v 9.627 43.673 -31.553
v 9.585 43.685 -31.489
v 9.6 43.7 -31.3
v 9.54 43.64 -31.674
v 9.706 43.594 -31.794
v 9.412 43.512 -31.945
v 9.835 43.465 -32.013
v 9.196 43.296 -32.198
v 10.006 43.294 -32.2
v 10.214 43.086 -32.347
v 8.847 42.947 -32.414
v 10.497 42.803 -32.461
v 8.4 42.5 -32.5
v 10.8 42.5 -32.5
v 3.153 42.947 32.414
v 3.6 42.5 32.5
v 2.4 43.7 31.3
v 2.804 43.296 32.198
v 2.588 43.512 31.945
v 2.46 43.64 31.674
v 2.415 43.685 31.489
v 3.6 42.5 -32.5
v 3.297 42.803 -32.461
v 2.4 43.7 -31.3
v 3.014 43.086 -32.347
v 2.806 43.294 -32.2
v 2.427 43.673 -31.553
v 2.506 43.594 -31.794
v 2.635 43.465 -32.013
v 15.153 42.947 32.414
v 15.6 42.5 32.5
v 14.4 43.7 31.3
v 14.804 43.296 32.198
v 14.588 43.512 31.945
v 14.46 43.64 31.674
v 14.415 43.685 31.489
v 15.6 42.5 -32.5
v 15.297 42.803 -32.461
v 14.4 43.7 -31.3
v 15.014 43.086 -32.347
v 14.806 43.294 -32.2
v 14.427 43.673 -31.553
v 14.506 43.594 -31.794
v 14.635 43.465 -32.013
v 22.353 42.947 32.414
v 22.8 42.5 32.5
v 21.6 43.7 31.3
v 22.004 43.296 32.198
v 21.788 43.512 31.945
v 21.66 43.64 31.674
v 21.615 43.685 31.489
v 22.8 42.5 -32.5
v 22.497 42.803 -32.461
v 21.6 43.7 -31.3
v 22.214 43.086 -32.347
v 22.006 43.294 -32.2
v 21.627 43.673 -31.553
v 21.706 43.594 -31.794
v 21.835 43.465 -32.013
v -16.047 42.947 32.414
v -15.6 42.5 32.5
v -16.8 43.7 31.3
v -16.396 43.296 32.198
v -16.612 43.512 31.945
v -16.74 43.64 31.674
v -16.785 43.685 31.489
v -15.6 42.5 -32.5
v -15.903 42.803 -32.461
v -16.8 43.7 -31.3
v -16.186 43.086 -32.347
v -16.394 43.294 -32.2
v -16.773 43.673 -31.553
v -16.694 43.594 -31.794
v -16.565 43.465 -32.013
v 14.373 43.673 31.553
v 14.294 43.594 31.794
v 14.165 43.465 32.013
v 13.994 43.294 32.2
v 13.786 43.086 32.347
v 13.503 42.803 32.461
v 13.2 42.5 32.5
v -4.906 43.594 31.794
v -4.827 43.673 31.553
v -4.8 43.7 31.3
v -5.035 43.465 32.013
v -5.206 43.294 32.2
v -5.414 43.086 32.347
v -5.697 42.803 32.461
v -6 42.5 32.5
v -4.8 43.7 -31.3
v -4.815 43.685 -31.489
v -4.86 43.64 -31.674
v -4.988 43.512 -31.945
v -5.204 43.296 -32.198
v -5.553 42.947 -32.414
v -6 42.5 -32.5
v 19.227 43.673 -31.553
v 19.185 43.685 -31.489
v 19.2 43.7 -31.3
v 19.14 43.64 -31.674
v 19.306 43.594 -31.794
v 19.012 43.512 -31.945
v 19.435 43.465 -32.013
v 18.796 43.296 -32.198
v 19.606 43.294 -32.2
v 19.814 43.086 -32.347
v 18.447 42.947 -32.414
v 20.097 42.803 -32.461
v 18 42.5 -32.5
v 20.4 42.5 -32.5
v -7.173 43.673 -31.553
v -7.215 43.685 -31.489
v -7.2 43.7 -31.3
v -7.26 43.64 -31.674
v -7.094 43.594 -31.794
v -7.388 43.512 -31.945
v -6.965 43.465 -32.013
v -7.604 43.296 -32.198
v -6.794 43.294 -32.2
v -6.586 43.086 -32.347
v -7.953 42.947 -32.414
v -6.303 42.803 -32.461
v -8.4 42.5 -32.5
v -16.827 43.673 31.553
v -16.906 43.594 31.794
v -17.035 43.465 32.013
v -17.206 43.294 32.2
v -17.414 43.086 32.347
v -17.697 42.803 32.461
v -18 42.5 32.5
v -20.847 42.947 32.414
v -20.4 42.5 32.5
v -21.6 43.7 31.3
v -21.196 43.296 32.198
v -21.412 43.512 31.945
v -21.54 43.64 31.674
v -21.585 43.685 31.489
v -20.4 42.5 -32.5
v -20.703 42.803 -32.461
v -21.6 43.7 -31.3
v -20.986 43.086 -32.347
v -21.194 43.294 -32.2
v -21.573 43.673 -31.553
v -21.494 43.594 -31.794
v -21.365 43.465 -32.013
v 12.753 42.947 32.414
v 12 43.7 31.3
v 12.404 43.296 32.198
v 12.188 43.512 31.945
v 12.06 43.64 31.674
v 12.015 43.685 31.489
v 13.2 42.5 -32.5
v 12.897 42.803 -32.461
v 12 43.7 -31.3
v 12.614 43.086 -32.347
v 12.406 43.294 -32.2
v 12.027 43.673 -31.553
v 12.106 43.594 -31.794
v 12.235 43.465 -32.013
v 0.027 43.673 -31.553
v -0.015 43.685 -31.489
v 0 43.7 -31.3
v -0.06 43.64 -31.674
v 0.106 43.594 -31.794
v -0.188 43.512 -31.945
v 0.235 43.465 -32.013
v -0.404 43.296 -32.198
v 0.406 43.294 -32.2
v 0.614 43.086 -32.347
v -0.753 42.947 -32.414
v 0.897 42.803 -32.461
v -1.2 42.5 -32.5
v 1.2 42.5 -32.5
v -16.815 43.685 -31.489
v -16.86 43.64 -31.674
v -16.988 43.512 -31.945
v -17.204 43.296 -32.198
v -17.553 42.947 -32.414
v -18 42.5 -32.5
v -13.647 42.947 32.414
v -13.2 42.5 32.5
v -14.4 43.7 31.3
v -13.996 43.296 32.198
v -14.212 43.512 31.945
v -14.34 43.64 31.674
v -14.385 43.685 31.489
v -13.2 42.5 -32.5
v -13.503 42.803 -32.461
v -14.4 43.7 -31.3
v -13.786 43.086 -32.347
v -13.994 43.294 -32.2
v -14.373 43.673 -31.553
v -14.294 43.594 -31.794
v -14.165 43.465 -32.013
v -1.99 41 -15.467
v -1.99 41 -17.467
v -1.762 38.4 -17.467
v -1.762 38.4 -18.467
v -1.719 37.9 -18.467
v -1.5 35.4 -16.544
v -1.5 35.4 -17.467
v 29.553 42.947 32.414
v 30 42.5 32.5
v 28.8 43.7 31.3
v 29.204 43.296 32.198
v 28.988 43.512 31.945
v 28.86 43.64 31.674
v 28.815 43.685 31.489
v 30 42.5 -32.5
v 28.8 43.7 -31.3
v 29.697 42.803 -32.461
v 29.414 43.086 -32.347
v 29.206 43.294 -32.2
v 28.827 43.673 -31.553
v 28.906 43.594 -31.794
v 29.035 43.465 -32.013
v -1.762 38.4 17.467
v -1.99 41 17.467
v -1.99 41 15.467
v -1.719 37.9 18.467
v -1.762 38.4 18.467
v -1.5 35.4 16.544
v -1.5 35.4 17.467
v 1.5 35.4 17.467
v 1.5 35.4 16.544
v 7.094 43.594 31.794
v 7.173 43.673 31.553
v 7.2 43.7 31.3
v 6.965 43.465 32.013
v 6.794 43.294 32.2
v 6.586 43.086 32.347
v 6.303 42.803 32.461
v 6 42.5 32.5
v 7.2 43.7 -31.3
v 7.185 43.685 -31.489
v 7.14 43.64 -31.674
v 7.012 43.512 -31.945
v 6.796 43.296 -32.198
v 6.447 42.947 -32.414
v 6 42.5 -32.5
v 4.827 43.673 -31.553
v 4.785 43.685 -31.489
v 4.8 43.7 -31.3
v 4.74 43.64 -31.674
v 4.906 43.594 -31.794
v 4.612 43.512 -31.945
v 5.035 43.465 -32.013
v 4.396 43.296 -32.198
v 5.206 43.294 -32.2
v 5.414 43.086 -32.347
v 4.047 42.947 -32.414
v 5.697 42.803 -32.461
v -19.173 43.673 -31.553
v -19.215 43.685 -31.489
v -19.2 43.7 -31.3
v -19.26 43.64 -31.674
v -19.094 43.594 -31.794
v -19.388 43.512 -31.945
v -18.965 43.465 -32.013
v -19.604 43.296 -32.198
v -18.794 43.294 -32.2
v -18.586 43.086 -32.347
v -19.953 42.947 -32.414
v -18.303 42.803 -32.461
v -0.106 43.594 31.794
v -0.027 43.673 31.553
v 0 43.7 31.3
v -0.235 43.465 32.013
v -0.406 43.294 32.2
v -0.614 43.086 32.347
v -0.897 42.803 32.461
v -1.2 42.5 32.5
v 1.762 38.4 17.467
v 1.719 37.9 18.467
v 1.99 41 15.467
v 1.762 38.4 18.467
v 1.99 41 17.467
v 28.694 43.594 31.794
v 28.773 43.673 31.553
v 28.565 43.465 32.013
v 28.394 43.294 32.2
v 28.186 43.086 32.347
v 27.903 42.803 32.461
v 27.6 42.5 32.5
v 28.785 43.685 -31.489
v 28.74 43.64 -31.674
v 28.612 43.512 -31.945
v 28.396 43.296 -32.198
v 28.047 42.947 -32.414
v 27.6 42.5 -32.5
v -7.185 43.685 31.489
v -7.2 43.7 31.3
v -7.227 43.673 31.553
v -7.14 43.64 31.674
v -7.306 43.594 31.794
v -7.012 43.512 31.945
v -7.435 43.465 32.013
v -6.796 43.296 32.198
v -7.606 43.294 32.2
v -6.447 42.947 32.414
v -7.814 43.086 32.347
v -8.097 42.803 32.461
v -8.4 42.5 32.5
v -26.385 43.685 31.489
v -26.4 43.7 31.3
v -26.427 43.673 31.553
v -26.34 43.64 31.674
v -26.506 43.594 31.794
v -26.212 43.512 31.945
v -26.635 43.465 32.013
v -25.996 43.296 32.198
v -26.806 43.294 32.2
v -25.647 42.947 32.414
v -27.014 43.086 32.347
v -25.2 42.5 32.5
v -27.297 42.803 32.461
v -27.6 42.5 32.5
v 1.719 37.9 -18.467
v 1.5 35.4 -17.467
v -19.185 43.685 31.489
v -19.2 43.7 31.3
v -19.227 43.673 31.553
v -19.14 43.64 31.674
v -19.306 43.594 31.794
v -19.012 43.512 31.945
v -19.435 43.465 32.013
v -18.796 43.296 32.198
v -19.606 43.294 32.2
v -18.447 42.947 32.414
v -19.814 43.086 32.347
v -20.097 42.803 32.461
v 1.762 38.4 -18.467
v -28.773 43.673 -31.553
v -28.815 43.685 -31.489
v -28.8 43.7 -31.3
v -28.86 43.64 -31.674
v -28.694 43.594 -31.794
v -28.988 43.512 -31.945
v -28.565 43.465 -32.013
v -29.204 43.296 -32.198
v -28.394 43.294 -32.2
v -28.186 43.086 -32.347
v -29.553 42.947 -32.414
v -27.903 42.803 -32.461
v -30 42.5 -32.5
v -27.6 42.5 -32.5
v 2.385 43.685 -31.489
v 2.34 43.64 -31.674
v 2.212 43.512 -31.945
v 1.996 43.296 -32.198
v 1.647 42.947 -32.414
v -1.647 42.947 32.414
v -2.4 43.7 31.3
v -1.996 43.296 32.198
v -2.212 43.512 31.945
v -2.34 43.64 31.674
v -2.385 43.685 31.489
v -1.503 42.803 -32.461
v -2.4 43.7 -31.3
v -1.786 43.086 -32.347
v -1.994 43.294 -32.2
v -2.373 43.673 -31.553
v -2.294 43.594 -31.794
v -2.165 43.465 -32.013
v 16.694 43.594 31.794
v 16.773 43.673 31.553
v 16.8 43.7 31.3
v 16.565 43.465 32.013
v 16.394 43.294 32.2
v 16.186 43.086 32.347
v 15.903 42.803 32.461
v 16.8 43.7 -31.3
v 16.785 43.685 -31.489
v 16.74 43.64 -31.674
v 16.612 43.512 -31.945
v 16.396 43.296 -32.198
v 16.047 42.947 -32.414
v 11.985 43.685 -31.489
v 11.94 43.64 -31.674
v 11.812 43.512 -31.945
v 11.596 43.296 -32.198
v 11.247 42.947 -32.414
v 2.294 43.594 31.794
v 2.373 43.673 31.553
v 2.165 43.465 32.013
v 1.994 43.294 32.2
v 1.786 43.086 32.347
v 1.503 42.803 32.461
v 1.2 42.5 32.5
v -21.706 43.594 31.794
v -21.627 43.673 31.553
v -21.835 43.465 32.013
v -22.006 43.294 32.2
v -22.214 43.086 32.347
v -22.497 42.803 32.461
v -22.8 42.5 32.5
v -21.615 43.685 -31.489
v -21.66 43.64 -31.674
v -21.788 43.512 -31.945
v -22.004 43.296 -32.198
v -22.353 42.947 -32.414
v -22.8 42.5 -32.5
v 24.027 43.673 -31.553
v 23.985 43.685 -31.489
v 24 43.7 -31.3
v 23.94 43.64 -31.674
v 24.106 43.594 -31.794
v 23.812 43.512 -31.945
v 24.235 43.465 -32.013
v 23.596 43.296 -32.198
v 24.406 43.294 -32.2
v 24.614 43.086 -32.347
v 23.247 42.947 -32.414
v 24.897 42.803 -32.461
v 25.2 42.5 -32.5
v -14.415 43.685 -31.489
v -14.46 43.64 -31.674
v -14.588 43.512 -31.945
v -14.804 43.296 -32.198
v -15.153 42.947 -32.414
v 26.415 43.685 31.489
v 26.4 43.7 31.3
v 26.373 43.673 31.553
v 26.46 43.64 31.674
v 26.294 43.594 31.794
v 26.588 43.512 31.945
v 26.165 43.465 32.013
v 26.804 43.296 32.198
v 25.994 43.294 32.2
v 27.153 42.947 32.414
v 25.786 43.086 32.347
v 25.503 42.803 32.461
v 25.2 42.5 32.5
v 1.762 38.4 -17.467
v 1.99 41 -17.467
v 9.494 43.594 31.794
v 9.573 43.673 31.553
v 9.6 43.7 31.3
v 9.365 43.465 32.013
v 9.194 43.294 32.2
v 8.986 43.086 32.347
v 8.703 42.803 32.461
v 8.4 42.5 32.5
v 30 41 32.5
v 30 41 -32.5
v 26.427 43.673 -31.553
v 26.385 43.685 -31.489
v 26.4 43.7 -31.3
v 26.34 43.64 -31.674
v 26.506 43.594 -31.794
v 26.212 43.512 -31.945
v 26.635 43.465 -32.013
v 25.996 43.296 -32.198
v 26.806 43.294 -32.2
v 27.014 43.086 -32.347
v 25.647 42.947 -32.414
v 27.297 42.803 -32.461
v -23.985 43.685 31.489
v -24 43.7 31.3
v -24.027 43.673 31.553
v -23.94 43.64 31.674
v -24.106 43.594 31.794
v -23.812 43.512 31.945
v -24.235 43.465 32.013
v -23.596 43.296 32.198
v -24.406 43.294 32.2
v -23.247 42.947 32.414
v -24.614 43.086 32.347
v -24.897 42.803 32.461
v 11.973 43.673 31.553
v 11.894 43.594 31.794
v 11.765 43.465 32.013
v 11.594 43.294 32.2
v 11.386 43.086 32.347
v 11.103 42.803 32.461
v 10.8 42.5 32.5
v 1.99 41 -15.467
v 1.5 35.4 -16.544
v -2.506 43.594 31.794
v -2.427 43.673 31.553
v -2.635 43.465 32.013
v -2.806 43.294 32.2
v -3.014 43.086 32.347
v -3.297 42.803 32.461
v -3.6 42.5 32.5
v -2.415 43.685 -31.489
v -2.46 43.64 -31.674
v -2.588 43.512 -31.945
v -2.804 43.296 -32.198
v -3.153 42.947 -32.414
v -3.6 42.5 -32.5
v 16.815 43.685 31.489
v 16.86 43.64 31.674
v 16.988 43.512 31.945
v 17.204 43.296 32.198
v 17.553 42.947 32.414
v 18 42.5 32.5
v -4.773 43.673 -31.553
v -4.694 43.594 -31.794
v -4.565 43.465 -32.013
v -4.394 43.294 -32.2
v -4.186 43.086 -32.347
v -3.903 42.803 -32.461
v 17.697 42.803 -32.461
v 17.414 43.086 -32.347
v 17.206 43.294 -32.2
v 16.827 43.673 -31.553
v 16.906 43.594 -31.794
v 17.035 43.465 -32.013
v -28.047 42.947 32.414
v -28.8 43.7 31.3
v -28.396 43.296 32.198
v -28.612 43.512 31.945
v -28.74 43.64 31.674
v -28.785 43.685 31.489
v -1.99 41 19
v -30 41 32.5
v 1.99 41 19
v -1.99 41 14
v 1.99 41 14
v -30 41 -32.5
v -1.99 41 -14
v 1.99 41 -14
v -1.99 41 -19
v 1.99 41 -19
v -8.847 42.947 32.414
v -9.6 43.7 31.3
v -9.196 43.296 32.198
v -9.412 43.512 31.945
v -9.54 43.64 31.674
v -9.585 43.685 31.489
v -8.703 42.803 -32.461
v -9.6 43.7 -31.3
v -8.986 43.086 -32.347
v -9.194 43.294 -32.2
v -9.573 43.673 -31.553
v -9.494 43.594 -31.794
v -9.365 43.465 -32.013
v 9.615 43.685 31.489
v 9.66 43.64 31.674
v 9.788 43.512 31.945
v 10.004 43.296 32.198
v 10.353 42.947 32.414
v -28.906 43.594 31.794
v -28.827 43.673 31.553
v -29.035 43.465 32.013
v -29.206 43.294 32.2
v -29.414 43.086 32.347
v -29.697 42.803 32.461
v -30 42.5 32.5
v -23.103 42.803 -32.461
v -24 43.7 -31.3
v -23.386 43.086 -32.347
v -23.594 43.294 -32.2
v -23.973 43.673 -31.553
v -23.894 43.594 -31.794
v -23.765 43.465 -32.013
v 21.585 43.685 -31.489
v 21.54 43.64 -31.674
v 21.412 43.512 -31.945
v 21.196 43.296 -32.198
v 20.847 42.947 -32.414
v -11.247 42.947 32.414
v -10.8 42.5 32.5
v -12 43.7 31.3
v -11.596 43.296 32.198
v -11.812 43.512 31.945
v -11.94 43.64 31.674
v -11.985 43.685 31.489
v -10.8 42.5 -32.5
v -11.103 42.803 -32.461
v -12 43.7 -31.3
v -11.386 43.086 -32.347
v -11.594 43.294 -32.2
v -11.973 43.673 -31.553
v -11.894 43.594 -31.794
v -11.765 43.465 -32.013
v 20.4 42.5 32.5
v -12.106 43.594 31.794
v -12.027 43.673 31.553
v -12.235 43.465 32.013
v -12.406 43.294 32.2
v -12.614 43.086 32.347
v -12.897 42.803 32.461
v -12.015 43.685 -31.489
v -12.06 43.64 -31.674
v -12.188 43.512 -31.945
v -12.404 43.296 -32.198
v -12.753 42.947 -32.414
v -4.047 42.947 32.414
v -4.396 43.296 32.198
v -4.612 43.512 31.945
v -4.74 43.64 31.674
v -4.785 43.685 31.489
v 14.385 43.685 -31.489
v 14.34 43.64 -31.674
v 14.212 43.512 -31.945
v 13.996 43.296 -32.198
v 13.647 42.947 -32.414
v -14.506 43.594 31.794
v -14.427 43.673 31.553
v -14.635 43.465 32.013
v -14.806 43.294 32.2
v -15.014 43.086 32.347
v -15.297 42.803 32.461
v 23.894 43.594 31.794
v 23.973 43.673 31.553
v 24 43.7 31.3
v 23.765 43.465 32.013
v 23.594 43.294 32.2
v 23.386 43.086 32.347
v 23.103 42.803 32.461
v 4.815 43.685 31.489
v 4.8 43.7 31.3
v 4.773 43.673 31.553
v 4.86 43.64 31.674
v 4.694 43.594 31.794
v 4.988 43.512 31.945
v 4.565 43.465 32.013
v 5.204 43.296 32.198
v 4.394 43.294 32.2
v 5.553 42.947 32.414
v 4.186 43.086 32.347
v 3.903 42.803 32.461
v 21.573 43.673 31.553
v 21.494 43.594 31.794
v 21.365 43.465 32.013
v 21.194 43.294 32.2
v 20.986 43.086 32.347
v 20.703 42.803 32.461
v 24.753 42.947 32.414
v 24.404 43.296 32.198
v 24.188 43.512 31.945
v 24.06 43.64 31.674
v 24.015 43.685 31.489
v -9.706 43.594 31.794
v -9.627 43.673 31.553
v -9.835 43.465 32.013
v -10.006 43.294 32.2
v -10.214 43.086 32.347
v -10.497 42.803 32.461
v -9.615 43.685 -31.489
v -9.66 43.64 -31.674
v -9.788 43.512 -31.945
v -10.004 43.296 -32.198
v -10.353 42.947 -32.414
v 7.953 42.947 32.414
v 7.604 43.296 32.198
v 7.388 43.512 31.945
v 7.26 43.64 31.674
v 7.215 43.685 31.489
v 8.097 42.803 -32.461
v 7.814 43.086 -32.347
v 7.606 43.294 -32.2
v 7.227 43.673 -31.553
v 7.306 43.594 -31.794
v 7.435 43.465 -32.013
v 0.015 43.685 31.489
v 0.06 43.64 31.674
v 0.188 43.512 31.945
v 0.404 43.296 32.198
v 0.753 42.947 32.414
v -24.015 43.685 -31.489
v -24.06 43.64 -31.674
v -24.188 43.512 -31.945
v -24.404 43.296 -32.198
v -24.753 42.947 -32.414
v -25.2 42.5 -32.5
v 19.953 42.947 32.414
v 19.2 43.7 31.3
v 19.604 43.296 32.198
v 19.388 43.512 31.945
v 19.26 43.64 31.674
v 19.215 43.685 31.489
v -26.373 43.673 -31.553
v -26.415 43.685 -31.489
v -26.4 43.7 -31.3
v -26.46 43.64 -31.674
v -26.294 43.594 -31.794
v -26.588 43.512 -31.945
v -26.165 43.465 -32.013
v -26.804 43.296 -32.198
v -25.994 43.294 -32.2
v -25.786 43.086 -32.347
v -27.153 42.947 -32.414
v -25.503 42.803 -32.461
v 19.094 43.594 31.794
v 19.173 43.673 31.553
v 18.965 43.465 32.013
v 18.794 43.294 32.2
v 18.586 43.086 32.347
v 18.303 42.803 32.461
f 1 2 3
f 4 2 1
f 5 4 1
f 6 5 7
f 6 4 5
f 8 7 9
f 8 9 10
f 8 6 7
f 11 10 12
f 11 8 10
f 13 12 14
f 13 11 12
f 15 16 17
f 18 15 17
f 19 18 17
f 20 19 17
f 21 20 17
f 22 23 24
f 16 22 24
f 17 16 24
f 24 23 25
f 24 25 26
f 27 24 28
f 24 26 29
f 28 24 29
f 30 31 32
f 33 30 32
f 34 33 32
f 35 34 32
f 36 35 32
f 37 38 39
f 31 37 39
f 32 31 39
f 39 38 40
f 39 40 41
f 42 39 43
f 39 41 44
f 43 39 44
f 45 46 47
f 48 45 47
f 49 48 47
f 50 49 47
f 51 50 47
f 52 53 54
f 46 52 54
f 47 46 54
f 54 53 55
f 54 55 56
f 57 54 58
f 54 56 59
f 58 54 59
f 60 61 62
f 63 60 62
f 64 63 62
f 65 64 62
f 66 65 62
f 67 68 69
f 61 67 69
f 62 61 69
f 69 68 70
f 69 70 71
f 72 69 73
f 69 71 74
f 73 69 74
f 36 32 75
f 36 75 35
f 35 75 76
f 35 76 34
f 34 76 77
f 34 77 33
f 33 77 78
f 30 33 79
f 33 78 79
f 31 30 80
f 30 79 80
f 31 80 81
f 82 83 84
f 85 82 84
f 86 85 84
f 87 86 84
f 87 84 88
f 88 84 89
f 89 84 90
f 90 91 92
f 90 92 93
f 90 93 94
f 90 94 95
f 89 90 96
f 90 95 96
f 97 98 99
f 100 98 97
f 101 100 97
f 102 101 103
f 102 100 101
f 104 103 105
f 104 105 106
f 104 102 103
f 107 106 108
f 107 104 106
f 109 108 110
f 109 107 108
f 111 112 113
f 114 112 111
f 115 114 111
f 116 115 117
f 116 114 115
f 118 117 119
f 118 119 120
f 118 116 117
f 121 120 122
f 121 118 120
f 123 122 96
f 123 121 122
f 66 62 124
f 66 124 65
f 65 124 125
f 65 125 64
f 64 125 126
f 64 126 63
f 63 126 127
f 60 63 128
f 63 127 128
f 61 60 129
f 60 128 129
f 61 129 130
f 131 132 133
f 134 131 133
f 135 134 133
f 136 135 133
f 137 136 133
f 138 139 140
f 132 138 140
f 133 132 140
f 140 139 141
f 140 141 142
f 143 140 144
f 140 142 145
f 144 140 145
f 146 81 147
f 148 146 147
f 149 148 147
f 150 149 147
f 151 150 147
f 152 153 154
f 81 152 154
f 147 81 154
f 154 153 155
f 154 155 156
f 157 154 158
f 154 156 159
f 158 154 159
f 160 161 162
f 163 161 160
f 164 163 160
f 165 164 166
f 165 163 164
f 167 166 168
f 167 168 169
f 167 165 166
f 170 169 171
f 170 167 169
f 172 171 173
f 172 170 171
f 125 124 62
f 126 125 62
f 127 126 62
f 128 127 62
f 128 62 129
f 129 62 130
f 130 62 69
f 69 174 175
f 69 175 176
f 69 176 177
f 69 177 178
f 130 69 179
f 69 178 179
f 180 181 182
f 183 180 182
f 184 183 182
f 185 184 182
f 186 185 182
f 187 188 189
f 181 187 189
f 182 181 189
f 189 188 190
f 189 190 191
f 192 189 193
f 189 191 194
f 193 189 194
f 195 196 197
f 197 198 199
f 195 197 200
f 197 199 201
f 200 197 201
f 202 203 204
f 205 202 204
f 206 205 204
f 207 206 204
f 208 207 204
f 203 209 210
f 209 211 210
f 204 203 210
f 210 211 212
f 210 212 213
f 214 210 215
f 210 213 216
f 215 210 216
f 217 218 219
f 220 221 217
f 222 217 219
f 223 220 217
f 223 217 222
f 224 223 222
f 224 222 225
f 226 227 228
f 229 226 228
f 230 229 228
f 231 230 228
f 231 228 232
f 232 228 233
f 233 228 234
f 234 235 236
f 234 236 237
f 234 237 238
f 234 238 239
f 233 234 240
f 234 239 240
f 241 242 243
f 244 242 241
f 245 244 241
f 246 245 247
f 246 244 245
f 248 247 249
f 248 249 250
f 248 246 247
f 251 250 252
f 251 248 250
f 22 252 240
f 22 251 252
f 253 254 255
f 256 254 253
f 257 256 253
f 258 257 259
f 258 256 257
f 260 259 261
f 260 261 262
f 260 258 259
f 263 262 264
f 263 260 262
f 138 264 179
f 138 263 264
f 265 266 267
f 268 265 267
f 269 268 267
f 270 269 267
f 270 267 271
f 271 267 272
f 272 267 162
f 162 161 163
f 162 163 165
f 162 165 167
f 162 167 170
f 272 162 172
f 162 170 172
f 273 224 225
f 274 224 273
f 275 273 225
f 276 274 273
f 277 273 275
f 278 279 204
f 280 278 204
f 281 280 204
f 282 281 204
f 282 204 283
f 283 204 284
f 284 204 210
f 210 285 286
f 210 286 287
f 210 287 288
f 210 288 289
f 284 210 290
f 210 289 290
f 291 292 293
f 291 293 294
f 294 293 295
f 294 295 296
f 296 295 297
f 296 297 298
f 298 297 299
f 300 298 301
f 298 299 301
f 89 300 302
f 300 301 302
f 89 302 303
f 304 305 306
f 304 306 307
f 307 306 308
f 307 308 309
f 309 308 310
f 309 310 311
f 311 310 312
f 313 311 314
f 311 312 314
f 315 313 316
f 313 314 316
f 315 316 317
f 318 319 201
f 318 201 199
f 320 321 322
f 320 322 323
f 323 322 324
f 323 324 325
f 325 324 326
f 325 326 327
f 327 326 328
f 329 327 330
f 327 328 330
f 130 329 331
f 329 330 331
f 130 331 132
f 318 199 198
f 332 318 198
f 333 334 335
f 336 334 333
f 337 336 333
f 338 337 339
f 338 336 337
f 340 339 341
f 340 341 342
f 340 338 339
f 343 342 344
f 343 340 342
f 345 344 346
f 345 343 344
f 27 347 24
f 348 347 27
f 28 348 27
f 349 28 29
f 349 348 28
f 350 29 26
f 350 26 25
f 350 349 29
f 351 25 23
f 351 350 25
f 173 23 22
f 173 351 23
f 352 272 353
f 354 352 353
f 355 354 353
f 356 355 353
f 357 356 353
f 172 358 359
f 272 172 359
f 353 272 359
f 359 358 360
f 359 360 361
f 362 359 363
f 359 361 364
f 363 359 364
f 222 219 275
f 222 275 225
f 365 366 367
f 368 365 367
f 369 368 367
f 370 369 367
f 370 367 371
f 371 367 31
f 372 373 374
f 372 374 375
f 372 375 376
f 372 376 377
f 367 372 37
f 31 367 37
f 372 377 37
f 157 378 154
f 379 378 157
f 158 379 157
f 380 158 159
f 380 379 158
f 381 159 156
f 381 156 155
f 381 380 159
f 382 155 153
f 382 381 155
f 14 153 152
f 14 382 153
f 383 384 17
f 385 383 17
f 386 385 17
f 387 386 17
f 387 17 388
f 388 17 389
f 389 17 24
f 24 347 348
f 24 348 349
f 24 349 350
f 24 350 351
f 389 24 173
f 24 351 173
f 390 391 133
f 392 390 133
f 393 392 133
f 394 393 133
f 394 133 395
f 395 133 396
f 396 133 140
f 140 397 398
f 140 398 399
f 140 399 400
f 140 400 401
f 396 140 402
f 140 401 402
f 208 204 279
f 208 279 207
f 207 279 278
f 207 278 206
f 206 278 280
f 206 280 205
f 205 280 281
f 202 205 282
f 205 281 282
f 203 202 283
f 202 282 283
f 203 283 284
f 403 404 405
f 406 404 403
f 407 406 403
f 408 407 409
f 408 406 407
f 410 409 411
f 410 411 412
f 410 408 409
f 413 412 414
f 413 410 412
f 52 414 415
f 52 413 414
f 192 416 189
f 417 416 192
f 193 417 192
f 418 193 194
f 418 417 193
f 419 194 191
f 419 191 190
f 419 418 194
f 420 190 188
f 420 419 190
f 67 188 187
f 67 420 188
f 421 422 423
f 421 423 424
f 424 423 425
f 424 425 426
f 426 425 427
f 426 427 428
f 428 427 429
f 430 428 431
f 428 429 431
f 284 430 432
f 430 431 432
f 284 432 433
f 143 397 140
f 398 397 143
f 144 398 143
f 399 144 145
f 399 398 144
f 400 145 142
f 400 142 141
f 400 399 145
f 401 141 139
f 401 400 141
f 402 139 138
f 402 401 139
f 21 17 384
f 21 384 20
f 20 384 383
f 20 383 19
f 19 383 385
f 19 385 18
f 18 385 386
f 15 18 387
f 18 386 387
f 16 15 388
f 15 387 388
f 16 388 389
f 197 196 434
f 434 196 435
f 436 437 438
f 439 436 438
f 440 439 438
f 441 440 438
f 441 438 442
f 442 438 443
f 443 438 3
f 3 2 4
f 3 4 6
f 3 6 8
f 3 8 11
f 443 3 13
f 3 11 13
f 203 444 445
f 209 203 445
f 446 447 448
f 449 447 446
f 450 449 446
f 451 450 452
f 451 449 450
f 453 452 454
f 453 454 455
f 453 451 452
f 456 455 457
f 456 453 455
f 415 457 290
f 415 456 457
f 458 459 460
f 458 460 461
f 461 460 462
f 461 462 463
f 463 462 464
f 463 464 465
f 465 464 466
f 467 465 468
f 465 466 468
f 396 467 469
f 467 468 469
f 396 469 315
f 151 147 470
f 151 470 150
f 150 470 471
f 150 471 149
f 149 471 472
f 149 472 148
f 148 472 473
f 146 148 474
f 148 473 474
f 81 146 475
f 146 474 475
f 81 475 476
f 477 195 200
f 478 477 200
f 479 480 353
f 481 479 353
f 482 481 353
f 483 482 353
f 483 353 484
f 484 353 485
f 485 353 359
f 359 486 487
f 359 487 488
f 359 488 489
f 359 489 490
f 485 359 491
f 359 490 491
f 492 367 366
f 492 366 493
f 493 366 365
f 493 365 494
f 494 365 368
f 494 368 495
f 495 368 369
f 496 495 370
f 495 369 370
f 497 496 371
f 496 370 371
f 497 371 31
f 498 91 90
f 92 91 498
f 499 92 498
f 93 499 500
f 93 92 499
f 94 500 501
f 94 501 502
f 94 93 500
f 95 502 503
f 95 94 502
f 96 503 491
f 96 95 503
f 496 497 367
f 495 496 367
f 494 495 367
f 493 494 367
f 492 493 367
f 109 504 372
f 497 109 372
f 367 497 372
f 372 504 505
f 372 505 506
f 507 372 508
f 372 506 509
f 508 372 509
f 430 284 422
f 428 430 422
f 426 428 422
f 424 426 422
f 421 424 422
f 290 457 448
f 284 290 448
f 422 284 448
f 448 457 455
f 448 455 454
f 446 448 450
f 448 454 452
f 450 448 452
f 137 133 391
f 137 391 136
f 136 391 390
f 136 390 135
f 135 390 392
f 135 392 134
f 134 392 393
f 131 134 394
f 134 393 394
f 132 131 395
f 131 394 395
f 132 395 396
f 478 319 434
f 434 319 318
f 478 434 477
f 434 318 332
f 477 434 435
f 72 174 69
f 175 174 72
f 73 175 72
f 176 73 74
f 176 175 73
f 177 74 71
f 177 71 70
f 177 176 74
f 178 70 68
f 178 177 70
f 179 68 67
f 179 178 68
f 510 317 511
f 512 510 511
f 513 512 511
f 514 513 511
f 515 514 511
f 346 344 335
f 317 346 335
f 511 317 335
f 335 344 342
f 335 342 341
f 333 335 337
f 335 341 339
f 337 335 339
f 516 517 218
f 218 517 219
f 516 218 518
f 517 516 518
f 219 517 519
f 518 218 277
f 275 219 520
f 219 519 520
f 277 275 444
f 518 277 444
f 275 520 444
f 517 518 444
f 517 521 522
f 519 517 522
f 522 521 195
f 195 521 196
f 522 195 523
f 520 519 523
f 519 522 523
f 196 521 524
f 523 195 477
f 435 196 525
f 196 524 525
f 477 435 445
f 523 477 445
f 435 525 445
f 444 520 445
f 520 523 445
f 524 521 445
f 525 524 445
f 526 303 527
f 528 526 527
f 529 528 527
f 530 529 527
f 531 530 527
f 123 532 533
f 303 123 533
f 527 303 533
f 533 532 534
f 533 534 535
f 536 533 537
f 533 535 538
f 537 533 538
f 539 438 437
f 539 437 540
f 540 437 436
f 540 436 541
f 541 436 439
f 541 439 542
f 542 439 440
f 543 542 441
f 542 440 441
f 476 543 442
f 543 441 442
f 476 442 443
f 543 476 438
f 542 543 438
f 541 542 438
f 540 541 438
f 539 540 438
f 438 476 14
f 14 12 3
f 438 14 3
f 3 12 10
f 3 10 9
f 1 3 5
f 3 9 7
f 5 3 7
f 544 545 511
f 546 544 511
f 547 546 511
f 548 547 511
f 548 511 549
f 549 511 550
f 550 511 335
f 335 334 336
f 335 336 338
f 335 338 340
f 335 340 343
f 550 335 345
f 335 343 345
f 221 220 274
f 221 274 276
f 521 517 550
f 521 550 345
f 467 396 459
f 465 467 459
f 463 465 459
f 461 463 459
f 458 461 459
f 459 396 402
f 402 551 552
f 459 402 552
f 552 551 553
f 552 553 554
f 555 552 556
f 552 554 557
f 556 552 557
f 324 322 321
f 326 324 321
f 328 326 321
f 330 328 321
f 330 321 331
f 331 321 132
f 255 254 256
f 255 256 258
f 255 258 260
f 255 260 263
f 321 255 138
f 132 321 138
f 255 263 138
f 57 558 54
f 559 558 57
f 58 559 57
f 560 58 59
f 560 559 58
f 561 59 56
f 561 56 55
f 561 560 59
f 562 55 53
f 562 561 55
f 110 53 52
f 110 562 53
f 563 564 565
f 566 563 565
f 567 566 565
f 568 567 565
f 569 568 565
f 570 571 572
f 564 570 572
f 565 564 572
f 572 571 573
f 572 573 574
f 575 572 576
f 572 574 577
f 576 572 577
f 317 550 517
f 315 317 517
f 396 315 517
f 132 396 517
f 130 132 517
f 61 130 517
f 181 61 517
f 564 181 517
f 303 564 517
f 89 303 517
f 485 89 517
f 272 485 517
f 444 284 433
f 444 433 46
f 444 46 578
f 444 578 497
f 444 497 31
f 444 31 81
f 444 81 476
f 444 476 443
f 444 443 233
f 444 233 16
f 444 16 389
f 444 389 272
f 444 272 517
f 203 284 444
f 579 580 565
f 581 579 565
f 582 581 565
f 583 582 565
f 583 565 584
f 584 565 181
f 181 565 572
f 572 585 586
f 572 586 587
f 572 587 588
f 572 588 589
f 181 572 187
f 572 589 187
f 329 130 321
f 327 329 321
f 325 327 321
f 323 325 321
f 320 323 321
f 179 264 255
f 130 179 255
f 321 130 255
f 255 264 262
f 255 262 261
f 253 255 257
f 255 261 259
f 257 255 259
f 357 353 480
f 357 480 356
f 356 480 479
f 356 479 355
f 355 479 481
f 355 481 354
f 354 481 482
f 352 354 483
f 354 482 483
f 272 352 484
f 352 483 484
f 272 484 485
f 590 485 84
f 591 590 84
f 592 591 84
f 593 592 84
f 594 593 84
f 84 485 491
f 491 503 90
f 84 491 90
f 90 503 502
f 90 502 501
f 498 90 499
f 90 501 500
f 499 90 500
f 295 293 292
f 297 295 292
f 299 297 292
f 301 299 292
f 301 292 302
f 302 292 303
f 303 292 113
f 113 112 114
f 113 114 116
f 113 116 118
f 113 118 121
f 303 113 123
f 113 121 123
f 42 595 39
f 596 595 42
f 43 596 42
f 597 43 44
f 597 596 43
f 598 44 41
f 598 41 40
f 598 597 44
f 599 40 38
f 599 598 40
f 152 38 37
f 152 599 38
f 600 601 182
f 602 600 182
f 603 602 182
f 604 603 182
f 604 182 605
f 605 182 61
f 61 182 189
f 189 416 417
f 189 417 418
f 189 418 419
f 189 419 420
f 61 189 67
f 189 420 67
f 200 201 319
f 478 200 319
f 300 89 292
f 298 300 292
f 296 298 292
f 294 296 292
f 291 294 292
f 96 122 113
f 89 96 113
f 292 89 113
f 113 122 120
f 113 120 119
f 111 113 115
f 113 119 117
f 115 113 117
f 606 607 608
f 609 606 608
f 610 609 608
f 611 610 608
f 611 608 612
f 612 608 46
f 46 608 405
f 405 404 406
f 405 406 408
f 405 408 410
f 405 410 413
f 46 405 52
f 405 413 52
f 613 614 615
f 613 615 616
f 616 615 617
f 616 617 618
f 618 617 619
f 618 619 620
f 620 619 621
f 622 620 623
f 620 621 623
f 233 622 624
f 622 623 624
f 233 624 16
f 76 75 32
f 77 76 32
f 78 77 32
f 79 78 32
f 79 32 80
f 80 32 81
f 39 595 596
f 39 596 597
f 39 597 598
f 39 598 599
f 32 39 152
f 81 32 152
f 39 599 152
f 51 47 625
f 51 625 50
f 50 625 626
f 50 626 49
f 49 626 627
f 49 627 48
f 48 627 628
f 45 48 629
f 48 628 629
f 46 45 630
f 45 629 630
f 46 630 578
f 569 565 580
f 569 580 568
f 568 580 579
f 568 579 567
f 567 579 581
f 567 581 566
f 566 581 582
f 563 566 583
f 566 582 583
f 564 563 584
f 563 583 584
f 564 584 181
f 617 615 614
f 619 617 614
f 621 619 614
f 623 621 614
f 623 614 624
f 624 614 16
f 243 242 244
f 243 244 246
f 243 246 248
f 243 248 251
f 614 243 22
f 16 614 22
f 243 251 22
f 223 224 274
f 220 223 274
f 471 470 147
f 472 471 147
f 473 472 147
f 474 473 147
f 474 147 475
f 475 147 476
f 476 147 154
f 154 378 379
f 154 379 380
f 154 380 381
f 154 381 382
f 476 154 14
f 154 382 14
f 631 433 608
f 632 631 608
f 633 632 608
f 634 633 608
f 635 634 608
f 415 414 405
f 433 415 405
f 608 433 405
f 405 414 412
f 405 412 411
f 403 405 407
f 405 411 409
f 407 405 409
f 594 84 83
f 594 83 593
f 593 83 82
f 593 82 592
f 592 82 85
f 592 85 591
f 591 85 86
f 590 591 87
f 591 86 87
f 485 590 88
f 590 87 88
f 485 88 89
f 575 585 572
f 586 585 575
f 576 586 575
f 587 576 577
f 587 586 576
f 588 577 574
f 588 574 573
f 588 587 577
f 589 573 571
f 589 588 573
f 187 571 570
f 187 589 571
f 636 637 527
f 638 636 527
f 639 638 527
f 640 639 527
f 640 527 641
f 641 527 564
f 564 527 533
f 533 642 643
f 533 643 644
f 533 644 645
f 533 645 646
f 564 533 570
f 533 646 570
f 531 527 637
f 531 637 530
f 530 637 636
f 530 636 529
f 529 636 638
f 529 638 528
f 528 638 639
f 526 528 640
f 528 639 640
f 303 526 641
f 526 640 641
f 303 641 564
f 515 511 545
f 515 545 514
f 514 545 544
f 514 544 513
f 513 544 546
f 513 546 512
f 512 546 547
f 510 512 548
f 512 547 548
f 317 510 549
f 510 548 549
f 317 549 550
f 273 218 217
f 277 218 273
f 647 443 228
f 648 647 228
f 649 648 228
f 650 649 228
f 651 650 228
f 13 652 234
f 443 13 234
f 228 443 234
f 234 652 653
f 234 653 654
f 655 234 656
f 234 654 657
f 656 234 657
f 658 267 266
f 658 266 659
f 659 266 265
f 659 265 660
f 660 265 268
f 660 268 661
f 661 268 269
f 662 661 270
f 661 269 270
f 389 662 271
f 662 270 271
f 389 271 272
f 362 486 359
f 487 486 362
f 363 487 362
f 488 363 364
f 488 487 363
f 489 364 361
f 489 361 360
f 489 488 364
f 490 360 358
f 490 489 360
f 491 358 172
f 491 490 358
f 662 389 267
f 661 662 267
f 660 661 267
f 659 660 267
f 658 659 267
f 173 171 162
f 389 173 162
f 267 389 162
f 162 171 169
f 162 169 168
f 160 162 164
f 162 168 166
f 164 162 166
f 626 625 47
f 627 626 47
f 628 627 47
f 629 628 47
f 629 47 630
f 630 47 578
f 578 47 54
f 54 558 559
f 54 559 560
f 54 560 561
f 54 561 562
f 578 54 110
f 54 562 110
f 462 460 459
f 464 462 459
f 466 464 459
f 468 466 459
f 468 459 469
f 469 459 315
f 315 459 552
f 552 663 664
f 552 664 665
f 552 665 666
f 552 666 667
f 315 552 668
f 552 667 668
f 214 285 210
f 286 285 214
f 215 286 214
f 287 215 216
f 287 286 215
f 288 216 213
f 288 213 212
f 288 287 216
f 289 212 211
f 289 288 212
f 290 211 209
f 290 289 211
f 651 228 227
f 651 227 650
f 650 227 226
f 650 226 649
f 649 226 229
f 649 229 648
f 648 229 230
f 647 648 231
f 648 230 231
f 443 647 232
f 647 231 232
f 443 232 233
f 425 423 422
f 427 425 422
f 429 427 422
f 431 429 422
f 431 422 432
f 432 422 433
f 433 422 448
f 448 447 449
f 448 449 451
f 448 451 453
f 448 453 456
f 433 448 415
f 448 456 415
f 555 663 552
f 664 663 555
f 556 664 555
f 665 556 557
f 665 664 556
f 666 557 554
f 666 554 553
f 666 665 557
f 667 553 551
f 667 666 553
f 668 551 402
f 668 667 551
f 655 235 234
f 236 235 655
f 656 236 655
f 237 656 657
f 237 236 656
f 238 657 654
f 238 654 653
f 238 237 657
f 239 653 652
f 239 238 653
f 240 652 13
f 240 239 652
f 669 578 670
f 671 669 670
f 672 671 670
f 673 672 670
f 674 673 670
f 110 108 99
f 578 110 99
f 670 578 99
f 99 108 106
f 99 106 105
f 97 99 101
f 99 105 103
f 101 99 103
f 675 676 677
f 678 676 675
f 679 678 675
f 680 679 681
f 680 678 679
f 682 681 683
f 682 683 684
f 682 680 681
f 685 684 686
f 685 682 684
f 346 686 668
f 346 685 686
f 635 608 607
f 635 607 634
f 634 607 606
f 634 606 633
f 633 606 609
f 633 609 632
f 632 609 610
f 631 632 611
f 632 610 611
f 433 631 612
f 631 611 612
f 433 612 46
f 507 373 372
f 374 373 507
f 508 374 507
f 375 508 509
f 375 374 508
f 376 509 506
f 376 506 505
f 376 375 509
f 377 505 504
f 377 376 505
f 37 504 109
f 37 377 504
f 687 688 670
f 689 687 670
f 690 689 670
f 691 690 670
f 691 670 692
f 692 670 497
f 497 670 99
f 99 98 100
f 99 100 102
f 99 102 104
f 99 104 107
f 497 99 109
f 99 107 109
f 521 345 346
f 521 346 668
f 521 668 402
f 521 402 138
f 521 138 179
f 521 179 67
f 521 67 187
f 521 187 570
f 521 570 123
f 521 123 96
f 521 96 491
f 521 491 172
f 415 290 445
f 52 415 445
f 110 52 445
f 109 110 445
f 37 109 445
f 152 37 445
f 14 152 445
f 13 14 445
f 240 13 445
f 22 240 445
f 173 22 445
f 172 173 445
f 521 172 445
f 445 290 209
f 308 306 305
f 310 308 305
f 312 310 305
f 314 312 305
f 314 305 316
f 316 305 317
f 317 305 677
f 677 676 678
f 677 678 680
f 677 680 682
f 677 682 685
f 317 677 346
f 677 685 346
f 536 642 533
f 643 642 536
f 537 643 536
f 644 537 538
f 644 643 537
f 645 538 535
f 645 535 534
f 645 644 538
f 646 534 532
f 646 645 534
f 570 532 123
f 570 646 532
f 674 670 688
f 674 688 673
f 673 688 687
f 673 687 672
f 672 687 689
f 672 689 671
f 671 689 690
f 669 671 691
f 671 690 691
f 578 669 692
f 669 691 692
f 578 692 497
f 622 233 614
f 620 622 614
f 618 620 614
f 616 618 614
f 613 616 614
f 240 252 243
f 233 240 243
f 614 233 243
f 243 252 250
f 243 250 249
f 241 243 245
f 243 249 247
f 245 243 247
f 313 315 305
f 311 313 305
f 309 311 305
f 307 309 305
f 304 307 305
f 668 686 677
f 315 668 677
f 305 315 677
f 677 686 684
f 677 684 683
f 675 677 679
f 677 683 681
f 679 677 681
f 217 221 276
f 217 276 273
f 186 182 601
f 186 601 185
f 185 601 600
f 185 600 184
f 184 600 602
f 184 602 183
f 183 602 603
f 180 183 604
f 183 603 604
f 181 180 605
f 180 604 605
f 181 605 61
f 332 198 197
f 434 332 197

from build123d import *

# Parameters (mm, degrees)
SKETCH1_W               = 60
SKETCH1_H               = 65
SKETCH1_W_2             = 55
SKETCH1_H_2             = 60
BOSS_EXTRUDE1_DEPTH     = 40
SKETCH2_W               = 60
SKETCH2_H               = 65
BOSS_EXTRUDE2_DEPTH     = 2.5
BOSS_EXTRUDE3_DEPTH     = 65
CUT_EXTRUDE1_REACH      = 83.03
CUT_EXTRUDE2_DEPTH      = 84.873058845
CUT_EXTRUDE2_DEPTH_BACK = 84.873058845
SKETCH5_W               = 60
SKETCH5_H               = 41
SNAP_START              = -17.466738465
SNAP_HOOK1_DEPTH        = 0.923076923
SNAP_START_2            = -1.762465991
SNAP_HOOK1_2_DEPTH      = 3.524931982
SNAP_START_3            = -1.989936516
SNAP_HOOK1_3_DEPTH      = 3.979873032
SNAP_START_4            = -19
SNAP_HOOK1_4_DEPTH      = 5


with BuildPart() as part:
    # Sketch1 → Boss-Extrude1 (new body)
    with BuildSketch(Plane(origin=(0, 0, 0), x_dir=(1, 0, 0), z_dir=(0, 1, 0))):
        Rectangle(SKETCH1_W, SKETCH1_H)
        Rectangle(SKETCH1_W_2, SKETCH1_H_2, mode=Mode.SUBTRACT)
    extrude(amount=BOSS_EXTRUDE1_DEPTH)

    # Sketch2 → Boss-Extrude2 (add)
    with BuildSketch(Plane(origin=(0, 40, 0), x_dir=(1, 0, 0), z_dir=(0, 1, 0))):
        Rectangle(SKETCH2_W, SKETCH2_H)
    extrude(amount=BOSS_EXTRUDE2_DEPTH)

    # Sketch3 → Boss-Extrude3 (add)
    with BuildSketch(Plane(origin=(0, 0, -32.5), x_dir=(-1, 0, 0), z_dir=(0, 0, -1))):
        Polygon((-30, 42.5), (-28.8, 43.7), (-27.6, 42.5), (-26.4, 43.7), (-25.2, 42.5), (-24, 43.7), (-22.8, 42.5), (-21.6, 43.7), (-20.4, 42.5), (-19.2, 43.7), (-18, 42.5), (-16.8, 43.7), (-15.6, 42.5), (-14.4, 43.7), (-13.2, 42.5), (-12, 43.7), (-10.8, 42.5), (-9.6, 43.7), (-8.4, 42.5), (-7.2, 43.7), (-6, 42.5), (-4.8, 43.7), (-3.6, 42.5), (-2.4, 43.7), (-1.2, 42.5), (0, 43.7), (1.2, 42.5), (2.4, 43.7), (3.6, 42.5), (4.8, 43.7), (6, 42.5), (7.2, 43.7), (8.4, 42.5), (9.6, 43.7), (10.8, 42.5), (12, 43.7), (13.2, 42.5), (14.4, 43.7), (15.6, 42.5), (16.8, 43.7), (18, 42.5), (19.2, 43.7), (20.4, 42.5), (21.6, 43.7), (22.8, 42.5), (24, 43.7), (25.2, 42.5), (26.4, 43.7), (27.6, 42.5), (28.8, 43.7), (30, 42.5), (30, 42.170064374), (-30, 42.170064374), align=None)
    extrude(amount=-BOSS_EXTRUDE3_DEPTH)

    # Cut-Extrude1: up to this face of the body (flat: up to its plane)
    cut_extrude1_end = Plane(part.part.faces().sort_by_distance((30, 21.25, 0))[0])
    # Sketch4 → Cut-Extrude1 (cut, up to the picked face)
    with BuildSketch(Plane.ZY.offset(30), mode=Mode.PRIVATE) as cut_extrude1_sk1:
        with BuildLine():
            Line((-32.5, 42.5), (-32.5, 43.7))
            Line((-32.5, 43.7), (-31.3, 43.7))
            ThreePointArc((-31.3, 43.7), (-32.148528137, 43.348528137), (-32.5, 42.5))
        make_face()
    cut_extrude1_tool1 = split(extrude(cut_extrude1_sk1.sketch, amount=-CUT_EXTRUDE1_REACH, mode=Mode.PRIVATE), bisect_by=cut_extrude1_end, keep=Keep.BOTH, mode=Mode.PRIVATE)
    cut_extrude1 = cut_extrude1_tool1.solids().sort_by(Axis((-30, 43.431958, -32.231958), (1, 0, 0)))[0]
    add(cut_extrude1, mode=Mode.SUBTRACT)

    # Mirror1: Cut-Extrude1 across plane
    add(cut_extrude1.mirror(Plane.XY), mode=Mode.SUBTRACT)

    # Sketch5 → Cut-Extrude2 (cut, two sides: drawn at the far end of the back side and taken through both)
    with BuildSketch(Plane.XY.offset(32.5).offset(-CUT_EXTRUDE2_DEPTH_BACK)):
        with Locations((0, 20.5)):
            Rectangle(SKETCH5_W, SKETCH5_H)
    extrude(amount=CUT_EXTRUDE2_DEPTH + CUT_EXTRUDE2_DEPTH_BACK, mode=Mode.SUBTRACT)

    # Snap Hook1: read off the stored shape, not the designer's step
    # Snap Hook1 outline → Snap Hook1 (add)
    with BuildSketch(Plane.XY.offset(SNAP_START)):
        Polygon((-1.5, 35.4), (1.5, 35.4), (1.989936516, 41), (-1.989936516, 41), align=None)
    snap_hook1 = extrude(amount=SNAP_HOOK1_DEPTH)

    # Snap Hook1 2 outline → Snap Hook1 2 (add)
    with BuildSketch(Plane.YZ.offset(SNAP_START_2)):
        Polygon((38.4, -17.466738465), (35.4, -17.466738465), (37.9, -18.466738465), (38.4, -18.466738465), align=None)
        Polygon((35.4, -16.543661542), (41, -16.543661542), (41, -15.466738465), align=None)
    snap_hook1_2 = extrude(amount=SNAP_HOOK1_2_DEPTH)

    # Snap Hook1 3 outline → Snap Hook1 3 (add)
    with BuildSketch(Plane.YZ.offset(SNAP_START_3)):
        Polygon((35.4, -16.543661542), (41, -16.543661542), (41, -15.466738465), align=None)
    snap_hook1_3 = extrude(amount=SNAP_HOOK1_3_DEPTH)

    # Snap Hook1 4 outline → Snap Hook1 4 (cut)
    with BuildSketch(Plane.XY.offset(SNAP_START_4)):
        Polygon((-1.989936516, 41), (-1.989936516, 34), (-1.377515871, 34), align=None)
        Polygon((1.377515871, 34), (1.989936516, 34), (1.989936516, 41), align=None)
    snap_hook1_4 = extrude(amount=SNAP_HOOK1_4_DEPTH, mode=Mode.SUBTRACT)

    # Mirror2: Snap Hook1, Snap Hook1 2, Snap Hook1 3, Snap Hook1 4 across plane
    add(snap_hook1.mirror(Plane.XY))
    add(snap_hook1_2.mirror(Plane.XY))
    add(snap_hook1_3.mirror(Plane.XY))
    add(snap_hook1_4.mirror(Plane.XY), mode=Mode.SUBTRACT)


solid = part.part
